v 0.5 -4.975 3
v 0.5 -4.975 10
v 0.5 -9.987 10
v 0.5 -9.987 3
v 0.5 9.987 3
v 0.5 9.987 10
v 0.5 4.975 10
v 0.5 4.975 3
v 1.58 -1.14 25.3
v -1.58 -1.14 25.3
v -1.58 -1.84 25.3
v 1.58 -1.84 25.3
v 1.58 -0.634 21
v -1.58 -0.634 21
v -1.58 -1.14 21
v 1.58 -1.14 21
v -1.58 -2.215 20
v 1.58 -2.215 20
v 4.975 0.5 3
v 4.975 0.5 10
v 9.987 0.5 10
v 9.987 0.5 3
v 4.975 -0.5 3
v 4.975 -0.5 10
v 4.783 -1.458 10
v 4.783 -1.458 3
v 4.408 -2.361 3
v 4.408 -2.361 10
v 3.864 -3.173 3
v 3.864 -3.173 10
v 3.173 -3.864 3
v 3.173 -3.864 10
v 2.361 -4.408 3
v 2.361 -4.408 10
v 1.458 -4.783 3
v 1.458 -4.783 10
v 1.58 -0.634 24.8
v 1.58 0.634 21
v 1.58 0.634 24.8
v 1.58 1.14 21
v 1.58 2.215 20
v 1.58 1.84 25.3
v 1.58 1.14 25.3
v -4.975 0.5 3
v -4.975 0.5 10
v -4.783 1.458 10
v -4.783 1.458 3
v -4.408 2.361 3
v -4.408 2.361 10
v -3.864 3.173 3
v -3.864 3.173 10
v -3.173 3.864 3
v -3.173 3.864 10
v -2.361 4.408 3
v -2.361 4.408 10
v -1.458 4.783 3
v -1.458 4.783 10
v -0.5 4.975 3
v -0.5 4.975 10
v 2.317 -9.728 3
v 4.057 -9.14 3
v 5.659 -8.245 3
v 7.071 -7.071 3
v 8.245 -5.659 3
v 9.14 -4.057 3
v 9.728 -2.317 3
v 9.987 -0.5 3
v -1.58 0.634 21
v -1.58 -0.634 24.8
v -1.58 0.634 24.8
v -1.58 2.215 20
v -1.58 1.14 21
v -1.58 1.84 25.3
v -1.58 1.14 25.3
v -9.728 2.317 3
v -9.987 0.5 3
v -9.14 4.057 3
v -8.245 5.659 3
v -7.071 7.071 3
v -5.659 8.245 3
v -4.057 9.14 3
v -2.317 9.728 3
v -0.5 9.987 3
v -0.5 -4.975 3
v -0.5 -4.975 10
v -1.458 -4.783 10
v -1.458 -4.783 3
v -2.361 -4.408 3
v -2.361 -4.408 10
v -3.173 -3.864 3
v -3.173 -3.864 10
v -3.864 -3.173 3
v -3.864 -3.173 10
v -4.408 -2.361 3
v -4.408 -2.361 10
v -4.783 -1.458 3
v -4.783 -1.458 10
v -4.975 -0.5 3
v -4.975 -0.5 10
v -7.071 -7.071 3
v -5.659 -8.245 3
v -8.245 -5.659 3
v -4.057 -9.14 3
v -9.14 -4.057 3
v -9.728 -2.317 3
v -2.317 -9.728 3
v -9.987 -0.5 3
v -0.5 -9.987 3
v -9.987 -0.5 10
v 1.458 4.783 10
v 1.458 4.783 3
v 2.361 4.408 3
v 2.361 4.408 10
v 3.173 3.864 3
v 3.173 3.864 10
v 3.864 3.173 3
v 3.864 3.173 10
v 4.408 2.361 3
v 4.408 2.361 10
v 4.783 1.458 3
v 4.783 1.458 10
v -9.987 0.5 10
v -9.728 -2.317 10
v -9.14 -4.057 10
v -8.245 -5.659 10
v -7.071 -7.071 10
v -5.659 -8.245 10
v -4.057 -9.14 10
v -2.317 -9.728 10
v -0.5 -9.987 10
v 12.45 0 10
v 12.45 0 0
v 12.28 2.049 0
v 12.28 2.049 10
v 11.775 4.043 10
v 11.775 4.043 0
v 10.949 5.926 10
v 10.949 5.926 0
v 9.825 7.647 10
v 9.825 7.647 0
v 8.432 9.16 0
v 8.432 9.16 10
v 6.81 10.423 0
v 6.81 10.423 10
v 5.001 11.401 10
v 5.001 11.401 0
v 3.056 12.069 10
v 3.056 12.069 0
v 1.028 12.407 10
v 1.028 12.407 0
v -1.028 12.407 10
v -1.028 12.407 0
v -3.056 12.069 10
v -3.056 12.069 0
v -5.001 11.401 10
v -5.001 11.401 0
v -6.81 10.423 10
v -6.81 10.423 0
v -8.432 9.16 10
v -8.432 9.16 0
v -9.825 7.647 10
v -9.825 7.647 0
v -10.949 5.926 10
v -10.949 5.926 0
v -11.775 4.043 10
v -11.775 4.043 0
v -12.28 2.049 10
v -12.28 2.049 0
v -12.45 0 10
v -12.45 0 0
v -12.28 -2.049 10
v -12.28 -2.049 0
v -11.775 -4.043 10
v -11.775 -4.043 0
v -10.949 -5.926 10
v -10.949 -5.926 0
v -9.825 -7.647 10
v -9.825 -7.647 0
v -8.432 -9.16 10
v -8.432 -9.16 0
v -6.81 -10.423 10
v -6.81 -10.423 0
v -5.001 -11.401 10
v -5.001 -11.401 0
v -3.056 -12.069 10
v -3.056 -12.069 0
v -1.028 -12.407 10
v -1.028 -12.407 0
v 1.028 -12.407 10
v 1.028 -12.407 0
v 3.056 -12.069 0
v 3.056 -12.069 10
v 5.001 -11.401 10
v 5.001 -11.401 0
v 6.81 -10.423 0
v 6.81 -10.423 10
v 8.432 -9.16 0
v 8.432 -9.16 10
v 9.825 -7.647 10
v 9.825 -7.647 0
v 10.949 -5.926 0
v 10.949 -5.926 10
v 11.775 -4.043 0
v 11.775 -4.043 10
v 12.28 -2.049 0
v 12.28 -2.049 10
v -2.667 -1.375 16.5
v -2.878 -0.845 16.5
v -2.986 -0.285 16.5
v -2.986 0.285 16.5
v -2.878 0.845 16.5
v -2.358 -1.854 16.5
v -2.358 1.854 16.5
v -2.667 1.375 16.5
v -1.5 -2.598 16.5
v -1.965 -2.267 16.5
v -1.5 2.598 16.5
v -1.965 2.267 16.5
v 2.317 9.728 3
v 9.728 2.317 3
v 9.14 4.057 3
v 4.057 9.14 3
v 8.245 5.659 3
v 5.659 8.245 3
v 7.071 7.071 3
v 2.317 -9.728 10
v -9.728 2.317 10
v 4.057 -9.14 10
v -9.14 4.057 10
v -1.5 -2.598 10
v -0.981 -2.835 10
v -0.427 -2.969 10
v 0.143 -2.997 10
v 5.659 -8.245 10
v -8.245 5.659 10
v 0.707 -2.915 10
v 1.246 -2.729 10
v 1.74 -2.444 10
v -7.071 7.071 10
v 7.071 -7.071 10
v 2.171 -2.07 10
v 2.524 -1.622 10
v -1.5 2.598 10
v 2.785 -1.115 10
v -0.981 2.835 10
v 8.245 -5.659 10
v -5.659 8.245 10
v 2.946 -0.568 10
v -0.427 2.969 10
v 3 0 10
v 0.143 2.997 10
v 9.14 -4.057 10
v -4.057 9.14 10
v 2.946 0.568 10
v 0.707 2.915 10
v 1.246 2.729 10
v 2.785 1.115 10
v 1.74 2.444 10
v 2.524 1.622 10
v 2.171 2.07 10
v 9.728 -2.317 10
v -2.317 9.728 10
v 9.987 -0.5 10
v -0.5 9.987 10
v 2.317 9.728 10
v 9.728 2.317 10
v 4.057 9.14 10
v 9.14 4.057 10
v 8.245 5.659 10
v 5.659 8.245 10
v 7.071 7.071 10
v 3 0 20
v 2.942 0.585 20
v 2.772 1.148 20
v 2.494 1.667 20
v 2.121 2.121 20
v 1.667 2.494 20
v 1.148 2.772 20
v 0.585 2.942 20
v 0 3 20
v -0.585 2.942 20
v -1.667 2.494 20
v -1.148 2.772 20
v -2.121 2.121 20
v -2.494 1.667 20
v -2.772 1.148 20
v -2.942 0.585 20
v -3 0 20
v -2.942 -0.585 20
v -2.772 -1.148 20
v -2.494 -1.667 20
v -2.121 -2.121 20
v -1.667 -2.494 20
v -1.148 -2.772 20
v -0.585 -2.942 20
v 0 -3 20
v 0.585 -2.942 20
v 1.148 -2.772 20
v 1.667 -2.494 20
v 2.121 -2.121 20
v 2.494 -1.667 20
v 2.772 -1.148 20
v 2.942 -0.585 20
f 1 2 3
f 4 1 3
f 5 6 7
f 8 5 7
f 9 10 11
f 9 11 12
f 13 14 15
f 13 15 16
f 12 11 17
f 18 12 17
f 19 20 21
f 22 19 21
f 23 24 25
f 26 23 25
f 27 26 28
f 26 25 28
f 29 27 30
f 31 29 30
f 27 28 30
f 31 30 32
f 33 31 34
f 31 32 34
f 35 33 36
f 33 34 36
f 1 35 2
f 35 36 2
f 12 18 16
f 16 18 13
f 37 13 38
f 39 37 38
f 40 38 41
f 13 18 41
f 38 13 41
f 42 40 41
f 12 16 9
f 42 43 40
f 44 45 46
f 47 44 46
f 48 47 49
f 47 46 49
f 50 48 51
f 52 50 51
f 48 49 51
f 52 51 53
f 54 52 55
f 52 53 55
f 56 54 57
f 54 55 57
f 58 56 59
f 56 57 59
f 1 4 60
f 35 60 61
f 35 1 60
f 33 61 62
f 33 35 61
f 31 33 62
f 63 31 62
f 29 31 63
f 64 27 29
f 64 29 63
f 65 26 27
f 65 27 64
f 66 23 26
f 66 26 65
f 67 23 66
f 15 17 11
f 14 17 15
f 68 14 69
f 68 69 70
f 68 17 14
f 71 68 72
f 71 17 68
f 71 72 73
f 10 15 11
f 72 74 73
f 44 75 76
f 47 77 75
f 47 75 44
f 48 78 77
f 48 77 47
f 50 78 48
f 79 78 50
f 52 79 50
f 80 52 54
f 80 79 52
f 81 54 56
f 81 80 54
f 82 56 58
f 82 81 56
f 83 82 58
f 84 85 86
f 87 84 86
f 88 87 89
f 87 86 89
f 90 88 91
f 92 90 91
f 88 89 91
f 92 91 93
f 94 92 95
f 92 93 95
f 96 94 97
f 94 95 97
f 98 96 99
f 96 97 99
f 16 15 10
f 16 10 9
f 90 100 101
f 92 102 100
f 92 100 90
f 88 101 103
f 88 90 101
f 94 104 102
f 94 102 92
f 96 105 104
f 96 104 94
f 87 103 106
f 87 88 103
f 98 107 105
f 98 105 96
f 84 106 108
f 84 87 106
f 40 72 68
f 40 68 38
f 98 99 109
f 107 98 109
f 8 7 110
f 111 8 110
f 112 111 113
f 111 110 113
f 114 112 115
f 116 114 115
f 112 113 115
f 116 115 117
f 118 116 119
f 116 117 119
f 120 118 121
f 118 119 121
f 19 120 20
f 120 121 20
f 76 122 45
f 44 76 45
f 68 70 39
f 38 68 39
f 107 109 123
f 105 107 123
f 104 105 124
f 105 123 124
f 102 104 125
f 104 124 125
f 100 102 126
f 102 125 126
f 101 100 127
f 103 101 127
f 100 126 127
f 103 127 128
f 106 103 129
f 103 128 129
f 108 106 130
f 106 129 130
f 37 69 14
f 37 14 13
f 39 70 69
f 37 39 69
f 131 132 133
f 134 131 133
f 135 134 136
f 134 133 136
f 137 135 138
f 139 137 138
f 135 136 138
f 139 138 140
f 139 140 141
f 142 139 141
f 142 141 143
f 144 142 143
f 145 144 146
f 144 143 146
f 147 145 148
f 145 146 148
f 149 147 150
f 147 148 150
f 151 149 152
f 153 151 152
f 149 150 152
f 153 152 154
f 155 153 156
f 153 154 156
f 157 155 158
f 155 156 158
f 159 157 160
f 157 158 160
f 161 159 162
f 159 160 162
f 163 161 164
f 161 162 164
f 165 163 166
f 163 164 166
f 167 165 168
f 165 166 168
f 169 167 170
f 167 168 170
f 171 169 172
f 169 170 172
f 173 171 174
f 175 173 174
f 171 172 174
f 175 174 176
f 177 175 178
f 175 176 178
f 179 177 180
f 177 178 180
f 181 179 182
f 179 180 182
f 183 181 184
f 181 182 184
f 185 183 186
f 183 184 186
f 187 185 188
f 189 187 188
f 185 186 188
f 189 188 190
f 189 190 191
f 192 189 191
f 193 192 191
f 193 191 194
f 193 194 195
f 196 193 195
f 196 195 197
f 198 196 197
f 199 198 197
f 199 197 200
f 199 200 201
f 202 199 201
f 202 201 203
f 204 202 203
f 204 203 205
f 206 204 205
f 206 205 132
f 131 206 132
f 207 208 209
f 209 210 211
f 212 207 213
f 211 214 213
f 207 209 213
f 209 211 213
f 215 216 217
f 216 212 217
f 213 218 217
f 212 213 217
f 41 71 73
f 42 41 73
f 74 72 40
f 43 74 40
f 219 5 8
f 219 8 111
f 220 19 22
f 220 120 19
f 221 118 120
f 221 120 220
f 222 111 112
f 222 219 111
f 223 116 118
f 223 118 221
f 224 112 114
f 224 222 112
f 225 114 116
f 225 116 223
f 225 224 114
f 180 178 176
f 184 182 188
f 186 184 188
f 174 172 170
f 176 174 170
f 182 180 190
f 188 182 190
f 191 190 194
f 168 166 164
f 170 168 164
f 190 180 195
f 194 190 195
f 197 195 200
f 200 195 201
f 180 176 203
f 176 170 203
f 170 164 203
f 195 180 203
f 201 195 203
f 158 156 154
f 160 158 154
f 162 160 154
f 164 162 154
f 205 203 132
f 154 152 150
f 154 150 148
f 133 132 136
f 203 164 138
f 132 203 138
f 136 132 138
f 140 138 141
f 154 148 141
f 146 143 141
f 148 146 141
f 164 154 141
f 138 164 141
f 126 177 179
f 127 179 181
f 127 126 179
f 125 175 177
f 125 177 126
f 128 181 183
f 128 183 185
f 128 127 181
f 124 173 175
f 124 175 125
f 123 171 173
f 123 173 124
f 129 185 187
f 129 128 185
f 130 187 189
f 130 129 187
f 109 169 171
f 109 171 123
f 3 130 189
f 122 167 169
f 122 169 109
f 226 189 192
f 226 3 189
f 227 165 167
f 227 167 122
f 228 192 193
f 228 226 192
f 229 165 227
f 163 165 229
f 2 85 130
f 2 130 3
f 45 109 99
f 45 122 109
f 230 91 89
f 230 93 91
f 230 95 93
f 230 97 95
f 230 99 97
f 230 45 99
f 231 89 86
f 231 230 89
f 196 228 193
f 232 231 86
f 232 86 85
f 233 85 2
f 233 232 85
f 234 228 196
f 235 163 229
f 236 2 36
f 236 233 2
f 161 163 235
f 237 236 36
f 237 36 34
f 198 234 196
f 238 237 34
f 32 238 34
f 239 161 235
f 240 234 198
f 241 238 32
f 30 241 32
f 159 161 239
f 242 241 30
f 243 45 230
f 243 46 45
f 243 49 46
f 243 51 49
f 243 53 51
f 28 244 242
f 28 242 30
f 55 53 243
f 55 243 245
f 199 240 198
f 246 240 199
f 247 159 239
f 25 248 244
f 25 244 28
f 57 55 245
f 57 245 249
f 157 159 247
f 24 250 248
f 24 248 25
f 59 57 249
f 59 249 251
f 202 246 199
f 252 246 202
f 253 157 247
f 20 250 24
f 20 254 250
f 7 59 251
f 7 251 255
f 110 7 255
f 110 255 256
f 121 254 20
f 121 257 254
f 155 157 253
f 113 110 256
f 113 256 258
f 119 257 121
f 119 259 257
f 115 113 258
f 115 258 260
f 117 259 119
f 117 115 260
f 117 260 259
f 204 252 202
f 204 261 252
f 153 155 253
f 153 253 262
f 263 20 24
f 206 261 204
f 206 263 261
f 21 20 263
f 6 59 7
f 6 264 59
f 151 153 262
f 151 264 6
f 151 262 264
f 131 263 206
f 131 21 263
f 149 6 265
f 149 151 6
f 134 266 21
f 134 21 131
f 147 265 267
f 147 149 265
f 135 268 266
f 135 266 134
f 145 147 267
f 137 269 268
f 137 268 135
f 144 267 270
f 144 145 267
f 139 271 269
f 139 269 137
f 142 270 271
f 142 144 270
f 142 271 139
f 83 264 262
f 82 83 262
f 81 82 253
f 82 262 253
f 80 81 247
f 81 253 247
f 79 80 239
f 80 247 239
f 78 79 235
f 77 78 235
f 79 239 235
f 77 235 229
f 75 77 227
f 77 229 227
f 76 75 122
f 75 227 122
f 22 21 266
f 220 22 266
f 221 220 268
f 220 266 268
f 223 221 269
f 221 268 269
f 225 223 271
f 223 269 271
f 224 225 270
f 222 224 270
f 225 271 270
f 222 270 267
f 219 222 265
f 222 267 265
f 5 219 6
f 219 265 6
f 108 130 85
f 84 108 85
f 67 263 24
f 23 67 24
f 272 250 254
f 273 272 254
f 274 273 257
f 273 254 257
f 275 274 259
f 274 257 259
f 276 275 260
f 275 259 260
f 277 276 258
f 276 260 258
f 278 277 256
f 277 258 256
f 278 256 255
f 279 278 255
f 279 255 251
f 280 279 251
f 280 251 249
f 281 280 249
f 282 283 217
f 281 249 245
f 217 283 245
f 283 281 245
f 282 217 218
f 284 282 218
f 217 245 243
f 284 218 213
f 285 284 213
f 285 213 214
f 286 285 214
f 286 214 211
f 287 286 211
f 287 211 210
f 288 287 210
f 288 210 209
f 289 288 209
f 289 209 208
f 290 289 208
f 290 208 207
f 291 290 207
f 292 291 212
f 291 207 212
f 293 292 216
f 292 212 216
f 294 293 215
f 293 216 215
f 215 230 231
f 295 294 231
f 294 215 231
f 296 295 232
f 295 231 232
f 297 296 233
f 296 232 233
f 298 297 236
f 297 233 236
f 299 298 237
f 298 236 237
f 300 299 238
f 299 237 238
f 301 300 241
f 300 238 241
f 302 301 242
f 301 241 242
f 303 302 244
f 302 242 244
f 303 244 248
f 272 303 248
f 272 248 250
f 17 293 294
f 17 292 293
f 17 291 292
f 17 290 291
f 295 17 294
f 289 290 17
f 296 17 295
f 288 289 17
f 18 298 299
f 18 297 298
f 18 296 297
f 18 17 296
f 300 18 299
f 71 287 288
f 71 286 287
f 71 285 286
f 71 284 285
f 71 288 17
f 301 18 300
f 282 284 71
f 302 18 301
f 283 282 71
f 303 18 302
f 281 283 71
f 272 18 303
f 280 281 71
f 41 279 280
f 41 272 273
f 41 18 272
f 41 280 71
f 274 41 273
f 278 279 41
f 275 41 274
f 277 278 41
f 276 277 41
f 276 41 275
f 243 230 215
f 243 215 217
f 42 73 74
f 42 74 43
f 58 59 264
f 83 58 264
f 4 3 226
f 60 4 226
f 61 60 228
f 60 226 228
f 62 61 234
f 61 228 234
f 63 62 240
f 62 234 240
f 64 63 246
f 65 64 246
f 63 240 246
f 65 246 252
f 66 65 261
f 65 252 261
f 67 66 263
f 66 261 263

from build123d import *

# Parameters (mm, degrees)
F0_R      = 12.45
F1_DEPTH  = 10
F2_R      = 3
F3_DEPTH  = 10
F4_W      = 3
F4_H      = 6
F5_DEPTH  = 6.5
F6_W      = 3.16
F6_H      = 4.43
F7_DEPTH  = 5.3
F8_W      = 3.16
F8_H      = 0.5056946463
F9_DEPTH  = 4.3
F11_DEPTH = 14.031
F12_W     = 1.2686107075
F12_H     = 0.5
F13_DEPTH = 14.031
F14_DEPTH = 7


with BuildPart() as f1:
    # F0 (on Top) → F1 (new body)
    with BuildSketch(Plane.XY):
        Circle(F0_R)
    extrude(amount=F1_DEPTH)

    # F2 (on face) → F3 (join)
    with BuildSketch(Plane.XY.offset(10)):
        Circle(F2_R)
    extrude(amount=F3_DEPTH)

    # F4 (on face) → F5 (cut)
    with BuildSketch(Plane.XY.offset(10)):
        with Locations((-3, 0)):
            Rectangle(F4_W, F4_H)
    extrude(amount=F5_DEPTH, mode=Mode.SUBTRACT)

    # F6 (on face) → F7 (join)
    with BuildSketch(Plane.XY.offset(20)):
        Rectangle(F6_W, F6_H)
    extrude(amount=F7_DEPTH)

    # F8 (on face) → F9 (cut)
    with BuildSketch(Plane.XY.offset(25.3)):
        with Locations((0, 0.8871526769)):
            Rectangle(F8_W, F8_H)
        with Locations((0, -0.8871526769)):
            Rectangle(F8_W, F8_H)
    extrude(amount=-F9_DEPTH, mode=Mode.SUBTRACT)

    # F10 (on face) → F11 (cut, through all)
    with BuildSketch(Plane(origin=(-1.58, 0, 0), x_dir=(0, -1, 0), z_dir=(-1, 0, 0))):
        Polygon((-2.215, 20), (-1.84, 25.3), (-2.215, 25.3), align=None)
        Polygon((1.84, 25.3), (2.215, 20), (2.215, 25.3), align=None)
    extrude(amount=-F11_DEPTH, mode=Mode.SUBTRACT)

    # F12 (on face) → F13 (cut, through all)
    with BuildSketch(Plane(origin=(-1.58, 0, 0), x_dir=(0, -1, 0), z_dir=(-1, 0, 0))):
        with Locations((0, 25.05)):
            Rectangle(F12_W, F12_H)
    extrude(amount=-F13_DEPTH, mode=Mode.SUBTRACT)

    # F2 (on face) → F14 (cut)
    with BuildSketch(Plane.XY.offset(10)):
        with BuildLine():
            Line((4.9749371855, 0.5), (9.9874921777, 0.5))
            ThreePointArc((9.9874921777, 0.5), (7.0710678119, 7.0710678119), (0.5, 9.9874921777))
            Line((0.5, 9.9874921777), (0.5, 4.9749371855))
            ThreePointArc((0.5, 4.9749371855), (3.5355339059, 3.5355339059), (4.9749371855, 0.5))
        make_face()
        with BuildLine():
            ThreePointArc((0.5, -9.9874921777), (7.0710678119, -7.0710678119), (9.9874921777, -0.5))
            Line((9.9874921777, -0.5), (4.9749371855, -0.5))
            ThreePointArc((4.9749371855, -0.5), (3.5355339059, -3.5355339059), (0.5, -4.9749371855))
            Line((0.5, -4.9749371855), (0.5, -9.9874921777))
        make_face()
        with BuildLine():
            Line((-0.5, -9.9874921777), (-0.5, -4.9749371855))
            ThreePointArc((-0.5, -4.9749371855), (-3.5355339059, -3.5355339059), (-4.9749371855, -0.5))
            Line((-4.9749371855, -0.5), (-9.9874921777, -0.5))
            ThreePointArc((-9.9874921777, -0.5), (-7.0710678119, -7.0710678119), (-0.5, -9.9874921777))
        make_face()
        with BuildLine():
            ThreePointArc((-4.9749371855, 0.5), (-3.5355339059, 3.5355339059), (-0.5, 4.9749371855))
            Line((-0.5, 4.9749371855), (-0.5, 9.9874921777))
            ThreePointArc((-0.5, 9.9874921777), (-7.0710678119, 7.0710678119), (-9.9874921777, 0.5))
            Line((-9.9874921777, 0.5), (-4.9749371855, 0.5))
        make_face()
    extrude(amount=-F14_DEPTH, mode=Mode.SUBTRACT)


solid = f1.part
